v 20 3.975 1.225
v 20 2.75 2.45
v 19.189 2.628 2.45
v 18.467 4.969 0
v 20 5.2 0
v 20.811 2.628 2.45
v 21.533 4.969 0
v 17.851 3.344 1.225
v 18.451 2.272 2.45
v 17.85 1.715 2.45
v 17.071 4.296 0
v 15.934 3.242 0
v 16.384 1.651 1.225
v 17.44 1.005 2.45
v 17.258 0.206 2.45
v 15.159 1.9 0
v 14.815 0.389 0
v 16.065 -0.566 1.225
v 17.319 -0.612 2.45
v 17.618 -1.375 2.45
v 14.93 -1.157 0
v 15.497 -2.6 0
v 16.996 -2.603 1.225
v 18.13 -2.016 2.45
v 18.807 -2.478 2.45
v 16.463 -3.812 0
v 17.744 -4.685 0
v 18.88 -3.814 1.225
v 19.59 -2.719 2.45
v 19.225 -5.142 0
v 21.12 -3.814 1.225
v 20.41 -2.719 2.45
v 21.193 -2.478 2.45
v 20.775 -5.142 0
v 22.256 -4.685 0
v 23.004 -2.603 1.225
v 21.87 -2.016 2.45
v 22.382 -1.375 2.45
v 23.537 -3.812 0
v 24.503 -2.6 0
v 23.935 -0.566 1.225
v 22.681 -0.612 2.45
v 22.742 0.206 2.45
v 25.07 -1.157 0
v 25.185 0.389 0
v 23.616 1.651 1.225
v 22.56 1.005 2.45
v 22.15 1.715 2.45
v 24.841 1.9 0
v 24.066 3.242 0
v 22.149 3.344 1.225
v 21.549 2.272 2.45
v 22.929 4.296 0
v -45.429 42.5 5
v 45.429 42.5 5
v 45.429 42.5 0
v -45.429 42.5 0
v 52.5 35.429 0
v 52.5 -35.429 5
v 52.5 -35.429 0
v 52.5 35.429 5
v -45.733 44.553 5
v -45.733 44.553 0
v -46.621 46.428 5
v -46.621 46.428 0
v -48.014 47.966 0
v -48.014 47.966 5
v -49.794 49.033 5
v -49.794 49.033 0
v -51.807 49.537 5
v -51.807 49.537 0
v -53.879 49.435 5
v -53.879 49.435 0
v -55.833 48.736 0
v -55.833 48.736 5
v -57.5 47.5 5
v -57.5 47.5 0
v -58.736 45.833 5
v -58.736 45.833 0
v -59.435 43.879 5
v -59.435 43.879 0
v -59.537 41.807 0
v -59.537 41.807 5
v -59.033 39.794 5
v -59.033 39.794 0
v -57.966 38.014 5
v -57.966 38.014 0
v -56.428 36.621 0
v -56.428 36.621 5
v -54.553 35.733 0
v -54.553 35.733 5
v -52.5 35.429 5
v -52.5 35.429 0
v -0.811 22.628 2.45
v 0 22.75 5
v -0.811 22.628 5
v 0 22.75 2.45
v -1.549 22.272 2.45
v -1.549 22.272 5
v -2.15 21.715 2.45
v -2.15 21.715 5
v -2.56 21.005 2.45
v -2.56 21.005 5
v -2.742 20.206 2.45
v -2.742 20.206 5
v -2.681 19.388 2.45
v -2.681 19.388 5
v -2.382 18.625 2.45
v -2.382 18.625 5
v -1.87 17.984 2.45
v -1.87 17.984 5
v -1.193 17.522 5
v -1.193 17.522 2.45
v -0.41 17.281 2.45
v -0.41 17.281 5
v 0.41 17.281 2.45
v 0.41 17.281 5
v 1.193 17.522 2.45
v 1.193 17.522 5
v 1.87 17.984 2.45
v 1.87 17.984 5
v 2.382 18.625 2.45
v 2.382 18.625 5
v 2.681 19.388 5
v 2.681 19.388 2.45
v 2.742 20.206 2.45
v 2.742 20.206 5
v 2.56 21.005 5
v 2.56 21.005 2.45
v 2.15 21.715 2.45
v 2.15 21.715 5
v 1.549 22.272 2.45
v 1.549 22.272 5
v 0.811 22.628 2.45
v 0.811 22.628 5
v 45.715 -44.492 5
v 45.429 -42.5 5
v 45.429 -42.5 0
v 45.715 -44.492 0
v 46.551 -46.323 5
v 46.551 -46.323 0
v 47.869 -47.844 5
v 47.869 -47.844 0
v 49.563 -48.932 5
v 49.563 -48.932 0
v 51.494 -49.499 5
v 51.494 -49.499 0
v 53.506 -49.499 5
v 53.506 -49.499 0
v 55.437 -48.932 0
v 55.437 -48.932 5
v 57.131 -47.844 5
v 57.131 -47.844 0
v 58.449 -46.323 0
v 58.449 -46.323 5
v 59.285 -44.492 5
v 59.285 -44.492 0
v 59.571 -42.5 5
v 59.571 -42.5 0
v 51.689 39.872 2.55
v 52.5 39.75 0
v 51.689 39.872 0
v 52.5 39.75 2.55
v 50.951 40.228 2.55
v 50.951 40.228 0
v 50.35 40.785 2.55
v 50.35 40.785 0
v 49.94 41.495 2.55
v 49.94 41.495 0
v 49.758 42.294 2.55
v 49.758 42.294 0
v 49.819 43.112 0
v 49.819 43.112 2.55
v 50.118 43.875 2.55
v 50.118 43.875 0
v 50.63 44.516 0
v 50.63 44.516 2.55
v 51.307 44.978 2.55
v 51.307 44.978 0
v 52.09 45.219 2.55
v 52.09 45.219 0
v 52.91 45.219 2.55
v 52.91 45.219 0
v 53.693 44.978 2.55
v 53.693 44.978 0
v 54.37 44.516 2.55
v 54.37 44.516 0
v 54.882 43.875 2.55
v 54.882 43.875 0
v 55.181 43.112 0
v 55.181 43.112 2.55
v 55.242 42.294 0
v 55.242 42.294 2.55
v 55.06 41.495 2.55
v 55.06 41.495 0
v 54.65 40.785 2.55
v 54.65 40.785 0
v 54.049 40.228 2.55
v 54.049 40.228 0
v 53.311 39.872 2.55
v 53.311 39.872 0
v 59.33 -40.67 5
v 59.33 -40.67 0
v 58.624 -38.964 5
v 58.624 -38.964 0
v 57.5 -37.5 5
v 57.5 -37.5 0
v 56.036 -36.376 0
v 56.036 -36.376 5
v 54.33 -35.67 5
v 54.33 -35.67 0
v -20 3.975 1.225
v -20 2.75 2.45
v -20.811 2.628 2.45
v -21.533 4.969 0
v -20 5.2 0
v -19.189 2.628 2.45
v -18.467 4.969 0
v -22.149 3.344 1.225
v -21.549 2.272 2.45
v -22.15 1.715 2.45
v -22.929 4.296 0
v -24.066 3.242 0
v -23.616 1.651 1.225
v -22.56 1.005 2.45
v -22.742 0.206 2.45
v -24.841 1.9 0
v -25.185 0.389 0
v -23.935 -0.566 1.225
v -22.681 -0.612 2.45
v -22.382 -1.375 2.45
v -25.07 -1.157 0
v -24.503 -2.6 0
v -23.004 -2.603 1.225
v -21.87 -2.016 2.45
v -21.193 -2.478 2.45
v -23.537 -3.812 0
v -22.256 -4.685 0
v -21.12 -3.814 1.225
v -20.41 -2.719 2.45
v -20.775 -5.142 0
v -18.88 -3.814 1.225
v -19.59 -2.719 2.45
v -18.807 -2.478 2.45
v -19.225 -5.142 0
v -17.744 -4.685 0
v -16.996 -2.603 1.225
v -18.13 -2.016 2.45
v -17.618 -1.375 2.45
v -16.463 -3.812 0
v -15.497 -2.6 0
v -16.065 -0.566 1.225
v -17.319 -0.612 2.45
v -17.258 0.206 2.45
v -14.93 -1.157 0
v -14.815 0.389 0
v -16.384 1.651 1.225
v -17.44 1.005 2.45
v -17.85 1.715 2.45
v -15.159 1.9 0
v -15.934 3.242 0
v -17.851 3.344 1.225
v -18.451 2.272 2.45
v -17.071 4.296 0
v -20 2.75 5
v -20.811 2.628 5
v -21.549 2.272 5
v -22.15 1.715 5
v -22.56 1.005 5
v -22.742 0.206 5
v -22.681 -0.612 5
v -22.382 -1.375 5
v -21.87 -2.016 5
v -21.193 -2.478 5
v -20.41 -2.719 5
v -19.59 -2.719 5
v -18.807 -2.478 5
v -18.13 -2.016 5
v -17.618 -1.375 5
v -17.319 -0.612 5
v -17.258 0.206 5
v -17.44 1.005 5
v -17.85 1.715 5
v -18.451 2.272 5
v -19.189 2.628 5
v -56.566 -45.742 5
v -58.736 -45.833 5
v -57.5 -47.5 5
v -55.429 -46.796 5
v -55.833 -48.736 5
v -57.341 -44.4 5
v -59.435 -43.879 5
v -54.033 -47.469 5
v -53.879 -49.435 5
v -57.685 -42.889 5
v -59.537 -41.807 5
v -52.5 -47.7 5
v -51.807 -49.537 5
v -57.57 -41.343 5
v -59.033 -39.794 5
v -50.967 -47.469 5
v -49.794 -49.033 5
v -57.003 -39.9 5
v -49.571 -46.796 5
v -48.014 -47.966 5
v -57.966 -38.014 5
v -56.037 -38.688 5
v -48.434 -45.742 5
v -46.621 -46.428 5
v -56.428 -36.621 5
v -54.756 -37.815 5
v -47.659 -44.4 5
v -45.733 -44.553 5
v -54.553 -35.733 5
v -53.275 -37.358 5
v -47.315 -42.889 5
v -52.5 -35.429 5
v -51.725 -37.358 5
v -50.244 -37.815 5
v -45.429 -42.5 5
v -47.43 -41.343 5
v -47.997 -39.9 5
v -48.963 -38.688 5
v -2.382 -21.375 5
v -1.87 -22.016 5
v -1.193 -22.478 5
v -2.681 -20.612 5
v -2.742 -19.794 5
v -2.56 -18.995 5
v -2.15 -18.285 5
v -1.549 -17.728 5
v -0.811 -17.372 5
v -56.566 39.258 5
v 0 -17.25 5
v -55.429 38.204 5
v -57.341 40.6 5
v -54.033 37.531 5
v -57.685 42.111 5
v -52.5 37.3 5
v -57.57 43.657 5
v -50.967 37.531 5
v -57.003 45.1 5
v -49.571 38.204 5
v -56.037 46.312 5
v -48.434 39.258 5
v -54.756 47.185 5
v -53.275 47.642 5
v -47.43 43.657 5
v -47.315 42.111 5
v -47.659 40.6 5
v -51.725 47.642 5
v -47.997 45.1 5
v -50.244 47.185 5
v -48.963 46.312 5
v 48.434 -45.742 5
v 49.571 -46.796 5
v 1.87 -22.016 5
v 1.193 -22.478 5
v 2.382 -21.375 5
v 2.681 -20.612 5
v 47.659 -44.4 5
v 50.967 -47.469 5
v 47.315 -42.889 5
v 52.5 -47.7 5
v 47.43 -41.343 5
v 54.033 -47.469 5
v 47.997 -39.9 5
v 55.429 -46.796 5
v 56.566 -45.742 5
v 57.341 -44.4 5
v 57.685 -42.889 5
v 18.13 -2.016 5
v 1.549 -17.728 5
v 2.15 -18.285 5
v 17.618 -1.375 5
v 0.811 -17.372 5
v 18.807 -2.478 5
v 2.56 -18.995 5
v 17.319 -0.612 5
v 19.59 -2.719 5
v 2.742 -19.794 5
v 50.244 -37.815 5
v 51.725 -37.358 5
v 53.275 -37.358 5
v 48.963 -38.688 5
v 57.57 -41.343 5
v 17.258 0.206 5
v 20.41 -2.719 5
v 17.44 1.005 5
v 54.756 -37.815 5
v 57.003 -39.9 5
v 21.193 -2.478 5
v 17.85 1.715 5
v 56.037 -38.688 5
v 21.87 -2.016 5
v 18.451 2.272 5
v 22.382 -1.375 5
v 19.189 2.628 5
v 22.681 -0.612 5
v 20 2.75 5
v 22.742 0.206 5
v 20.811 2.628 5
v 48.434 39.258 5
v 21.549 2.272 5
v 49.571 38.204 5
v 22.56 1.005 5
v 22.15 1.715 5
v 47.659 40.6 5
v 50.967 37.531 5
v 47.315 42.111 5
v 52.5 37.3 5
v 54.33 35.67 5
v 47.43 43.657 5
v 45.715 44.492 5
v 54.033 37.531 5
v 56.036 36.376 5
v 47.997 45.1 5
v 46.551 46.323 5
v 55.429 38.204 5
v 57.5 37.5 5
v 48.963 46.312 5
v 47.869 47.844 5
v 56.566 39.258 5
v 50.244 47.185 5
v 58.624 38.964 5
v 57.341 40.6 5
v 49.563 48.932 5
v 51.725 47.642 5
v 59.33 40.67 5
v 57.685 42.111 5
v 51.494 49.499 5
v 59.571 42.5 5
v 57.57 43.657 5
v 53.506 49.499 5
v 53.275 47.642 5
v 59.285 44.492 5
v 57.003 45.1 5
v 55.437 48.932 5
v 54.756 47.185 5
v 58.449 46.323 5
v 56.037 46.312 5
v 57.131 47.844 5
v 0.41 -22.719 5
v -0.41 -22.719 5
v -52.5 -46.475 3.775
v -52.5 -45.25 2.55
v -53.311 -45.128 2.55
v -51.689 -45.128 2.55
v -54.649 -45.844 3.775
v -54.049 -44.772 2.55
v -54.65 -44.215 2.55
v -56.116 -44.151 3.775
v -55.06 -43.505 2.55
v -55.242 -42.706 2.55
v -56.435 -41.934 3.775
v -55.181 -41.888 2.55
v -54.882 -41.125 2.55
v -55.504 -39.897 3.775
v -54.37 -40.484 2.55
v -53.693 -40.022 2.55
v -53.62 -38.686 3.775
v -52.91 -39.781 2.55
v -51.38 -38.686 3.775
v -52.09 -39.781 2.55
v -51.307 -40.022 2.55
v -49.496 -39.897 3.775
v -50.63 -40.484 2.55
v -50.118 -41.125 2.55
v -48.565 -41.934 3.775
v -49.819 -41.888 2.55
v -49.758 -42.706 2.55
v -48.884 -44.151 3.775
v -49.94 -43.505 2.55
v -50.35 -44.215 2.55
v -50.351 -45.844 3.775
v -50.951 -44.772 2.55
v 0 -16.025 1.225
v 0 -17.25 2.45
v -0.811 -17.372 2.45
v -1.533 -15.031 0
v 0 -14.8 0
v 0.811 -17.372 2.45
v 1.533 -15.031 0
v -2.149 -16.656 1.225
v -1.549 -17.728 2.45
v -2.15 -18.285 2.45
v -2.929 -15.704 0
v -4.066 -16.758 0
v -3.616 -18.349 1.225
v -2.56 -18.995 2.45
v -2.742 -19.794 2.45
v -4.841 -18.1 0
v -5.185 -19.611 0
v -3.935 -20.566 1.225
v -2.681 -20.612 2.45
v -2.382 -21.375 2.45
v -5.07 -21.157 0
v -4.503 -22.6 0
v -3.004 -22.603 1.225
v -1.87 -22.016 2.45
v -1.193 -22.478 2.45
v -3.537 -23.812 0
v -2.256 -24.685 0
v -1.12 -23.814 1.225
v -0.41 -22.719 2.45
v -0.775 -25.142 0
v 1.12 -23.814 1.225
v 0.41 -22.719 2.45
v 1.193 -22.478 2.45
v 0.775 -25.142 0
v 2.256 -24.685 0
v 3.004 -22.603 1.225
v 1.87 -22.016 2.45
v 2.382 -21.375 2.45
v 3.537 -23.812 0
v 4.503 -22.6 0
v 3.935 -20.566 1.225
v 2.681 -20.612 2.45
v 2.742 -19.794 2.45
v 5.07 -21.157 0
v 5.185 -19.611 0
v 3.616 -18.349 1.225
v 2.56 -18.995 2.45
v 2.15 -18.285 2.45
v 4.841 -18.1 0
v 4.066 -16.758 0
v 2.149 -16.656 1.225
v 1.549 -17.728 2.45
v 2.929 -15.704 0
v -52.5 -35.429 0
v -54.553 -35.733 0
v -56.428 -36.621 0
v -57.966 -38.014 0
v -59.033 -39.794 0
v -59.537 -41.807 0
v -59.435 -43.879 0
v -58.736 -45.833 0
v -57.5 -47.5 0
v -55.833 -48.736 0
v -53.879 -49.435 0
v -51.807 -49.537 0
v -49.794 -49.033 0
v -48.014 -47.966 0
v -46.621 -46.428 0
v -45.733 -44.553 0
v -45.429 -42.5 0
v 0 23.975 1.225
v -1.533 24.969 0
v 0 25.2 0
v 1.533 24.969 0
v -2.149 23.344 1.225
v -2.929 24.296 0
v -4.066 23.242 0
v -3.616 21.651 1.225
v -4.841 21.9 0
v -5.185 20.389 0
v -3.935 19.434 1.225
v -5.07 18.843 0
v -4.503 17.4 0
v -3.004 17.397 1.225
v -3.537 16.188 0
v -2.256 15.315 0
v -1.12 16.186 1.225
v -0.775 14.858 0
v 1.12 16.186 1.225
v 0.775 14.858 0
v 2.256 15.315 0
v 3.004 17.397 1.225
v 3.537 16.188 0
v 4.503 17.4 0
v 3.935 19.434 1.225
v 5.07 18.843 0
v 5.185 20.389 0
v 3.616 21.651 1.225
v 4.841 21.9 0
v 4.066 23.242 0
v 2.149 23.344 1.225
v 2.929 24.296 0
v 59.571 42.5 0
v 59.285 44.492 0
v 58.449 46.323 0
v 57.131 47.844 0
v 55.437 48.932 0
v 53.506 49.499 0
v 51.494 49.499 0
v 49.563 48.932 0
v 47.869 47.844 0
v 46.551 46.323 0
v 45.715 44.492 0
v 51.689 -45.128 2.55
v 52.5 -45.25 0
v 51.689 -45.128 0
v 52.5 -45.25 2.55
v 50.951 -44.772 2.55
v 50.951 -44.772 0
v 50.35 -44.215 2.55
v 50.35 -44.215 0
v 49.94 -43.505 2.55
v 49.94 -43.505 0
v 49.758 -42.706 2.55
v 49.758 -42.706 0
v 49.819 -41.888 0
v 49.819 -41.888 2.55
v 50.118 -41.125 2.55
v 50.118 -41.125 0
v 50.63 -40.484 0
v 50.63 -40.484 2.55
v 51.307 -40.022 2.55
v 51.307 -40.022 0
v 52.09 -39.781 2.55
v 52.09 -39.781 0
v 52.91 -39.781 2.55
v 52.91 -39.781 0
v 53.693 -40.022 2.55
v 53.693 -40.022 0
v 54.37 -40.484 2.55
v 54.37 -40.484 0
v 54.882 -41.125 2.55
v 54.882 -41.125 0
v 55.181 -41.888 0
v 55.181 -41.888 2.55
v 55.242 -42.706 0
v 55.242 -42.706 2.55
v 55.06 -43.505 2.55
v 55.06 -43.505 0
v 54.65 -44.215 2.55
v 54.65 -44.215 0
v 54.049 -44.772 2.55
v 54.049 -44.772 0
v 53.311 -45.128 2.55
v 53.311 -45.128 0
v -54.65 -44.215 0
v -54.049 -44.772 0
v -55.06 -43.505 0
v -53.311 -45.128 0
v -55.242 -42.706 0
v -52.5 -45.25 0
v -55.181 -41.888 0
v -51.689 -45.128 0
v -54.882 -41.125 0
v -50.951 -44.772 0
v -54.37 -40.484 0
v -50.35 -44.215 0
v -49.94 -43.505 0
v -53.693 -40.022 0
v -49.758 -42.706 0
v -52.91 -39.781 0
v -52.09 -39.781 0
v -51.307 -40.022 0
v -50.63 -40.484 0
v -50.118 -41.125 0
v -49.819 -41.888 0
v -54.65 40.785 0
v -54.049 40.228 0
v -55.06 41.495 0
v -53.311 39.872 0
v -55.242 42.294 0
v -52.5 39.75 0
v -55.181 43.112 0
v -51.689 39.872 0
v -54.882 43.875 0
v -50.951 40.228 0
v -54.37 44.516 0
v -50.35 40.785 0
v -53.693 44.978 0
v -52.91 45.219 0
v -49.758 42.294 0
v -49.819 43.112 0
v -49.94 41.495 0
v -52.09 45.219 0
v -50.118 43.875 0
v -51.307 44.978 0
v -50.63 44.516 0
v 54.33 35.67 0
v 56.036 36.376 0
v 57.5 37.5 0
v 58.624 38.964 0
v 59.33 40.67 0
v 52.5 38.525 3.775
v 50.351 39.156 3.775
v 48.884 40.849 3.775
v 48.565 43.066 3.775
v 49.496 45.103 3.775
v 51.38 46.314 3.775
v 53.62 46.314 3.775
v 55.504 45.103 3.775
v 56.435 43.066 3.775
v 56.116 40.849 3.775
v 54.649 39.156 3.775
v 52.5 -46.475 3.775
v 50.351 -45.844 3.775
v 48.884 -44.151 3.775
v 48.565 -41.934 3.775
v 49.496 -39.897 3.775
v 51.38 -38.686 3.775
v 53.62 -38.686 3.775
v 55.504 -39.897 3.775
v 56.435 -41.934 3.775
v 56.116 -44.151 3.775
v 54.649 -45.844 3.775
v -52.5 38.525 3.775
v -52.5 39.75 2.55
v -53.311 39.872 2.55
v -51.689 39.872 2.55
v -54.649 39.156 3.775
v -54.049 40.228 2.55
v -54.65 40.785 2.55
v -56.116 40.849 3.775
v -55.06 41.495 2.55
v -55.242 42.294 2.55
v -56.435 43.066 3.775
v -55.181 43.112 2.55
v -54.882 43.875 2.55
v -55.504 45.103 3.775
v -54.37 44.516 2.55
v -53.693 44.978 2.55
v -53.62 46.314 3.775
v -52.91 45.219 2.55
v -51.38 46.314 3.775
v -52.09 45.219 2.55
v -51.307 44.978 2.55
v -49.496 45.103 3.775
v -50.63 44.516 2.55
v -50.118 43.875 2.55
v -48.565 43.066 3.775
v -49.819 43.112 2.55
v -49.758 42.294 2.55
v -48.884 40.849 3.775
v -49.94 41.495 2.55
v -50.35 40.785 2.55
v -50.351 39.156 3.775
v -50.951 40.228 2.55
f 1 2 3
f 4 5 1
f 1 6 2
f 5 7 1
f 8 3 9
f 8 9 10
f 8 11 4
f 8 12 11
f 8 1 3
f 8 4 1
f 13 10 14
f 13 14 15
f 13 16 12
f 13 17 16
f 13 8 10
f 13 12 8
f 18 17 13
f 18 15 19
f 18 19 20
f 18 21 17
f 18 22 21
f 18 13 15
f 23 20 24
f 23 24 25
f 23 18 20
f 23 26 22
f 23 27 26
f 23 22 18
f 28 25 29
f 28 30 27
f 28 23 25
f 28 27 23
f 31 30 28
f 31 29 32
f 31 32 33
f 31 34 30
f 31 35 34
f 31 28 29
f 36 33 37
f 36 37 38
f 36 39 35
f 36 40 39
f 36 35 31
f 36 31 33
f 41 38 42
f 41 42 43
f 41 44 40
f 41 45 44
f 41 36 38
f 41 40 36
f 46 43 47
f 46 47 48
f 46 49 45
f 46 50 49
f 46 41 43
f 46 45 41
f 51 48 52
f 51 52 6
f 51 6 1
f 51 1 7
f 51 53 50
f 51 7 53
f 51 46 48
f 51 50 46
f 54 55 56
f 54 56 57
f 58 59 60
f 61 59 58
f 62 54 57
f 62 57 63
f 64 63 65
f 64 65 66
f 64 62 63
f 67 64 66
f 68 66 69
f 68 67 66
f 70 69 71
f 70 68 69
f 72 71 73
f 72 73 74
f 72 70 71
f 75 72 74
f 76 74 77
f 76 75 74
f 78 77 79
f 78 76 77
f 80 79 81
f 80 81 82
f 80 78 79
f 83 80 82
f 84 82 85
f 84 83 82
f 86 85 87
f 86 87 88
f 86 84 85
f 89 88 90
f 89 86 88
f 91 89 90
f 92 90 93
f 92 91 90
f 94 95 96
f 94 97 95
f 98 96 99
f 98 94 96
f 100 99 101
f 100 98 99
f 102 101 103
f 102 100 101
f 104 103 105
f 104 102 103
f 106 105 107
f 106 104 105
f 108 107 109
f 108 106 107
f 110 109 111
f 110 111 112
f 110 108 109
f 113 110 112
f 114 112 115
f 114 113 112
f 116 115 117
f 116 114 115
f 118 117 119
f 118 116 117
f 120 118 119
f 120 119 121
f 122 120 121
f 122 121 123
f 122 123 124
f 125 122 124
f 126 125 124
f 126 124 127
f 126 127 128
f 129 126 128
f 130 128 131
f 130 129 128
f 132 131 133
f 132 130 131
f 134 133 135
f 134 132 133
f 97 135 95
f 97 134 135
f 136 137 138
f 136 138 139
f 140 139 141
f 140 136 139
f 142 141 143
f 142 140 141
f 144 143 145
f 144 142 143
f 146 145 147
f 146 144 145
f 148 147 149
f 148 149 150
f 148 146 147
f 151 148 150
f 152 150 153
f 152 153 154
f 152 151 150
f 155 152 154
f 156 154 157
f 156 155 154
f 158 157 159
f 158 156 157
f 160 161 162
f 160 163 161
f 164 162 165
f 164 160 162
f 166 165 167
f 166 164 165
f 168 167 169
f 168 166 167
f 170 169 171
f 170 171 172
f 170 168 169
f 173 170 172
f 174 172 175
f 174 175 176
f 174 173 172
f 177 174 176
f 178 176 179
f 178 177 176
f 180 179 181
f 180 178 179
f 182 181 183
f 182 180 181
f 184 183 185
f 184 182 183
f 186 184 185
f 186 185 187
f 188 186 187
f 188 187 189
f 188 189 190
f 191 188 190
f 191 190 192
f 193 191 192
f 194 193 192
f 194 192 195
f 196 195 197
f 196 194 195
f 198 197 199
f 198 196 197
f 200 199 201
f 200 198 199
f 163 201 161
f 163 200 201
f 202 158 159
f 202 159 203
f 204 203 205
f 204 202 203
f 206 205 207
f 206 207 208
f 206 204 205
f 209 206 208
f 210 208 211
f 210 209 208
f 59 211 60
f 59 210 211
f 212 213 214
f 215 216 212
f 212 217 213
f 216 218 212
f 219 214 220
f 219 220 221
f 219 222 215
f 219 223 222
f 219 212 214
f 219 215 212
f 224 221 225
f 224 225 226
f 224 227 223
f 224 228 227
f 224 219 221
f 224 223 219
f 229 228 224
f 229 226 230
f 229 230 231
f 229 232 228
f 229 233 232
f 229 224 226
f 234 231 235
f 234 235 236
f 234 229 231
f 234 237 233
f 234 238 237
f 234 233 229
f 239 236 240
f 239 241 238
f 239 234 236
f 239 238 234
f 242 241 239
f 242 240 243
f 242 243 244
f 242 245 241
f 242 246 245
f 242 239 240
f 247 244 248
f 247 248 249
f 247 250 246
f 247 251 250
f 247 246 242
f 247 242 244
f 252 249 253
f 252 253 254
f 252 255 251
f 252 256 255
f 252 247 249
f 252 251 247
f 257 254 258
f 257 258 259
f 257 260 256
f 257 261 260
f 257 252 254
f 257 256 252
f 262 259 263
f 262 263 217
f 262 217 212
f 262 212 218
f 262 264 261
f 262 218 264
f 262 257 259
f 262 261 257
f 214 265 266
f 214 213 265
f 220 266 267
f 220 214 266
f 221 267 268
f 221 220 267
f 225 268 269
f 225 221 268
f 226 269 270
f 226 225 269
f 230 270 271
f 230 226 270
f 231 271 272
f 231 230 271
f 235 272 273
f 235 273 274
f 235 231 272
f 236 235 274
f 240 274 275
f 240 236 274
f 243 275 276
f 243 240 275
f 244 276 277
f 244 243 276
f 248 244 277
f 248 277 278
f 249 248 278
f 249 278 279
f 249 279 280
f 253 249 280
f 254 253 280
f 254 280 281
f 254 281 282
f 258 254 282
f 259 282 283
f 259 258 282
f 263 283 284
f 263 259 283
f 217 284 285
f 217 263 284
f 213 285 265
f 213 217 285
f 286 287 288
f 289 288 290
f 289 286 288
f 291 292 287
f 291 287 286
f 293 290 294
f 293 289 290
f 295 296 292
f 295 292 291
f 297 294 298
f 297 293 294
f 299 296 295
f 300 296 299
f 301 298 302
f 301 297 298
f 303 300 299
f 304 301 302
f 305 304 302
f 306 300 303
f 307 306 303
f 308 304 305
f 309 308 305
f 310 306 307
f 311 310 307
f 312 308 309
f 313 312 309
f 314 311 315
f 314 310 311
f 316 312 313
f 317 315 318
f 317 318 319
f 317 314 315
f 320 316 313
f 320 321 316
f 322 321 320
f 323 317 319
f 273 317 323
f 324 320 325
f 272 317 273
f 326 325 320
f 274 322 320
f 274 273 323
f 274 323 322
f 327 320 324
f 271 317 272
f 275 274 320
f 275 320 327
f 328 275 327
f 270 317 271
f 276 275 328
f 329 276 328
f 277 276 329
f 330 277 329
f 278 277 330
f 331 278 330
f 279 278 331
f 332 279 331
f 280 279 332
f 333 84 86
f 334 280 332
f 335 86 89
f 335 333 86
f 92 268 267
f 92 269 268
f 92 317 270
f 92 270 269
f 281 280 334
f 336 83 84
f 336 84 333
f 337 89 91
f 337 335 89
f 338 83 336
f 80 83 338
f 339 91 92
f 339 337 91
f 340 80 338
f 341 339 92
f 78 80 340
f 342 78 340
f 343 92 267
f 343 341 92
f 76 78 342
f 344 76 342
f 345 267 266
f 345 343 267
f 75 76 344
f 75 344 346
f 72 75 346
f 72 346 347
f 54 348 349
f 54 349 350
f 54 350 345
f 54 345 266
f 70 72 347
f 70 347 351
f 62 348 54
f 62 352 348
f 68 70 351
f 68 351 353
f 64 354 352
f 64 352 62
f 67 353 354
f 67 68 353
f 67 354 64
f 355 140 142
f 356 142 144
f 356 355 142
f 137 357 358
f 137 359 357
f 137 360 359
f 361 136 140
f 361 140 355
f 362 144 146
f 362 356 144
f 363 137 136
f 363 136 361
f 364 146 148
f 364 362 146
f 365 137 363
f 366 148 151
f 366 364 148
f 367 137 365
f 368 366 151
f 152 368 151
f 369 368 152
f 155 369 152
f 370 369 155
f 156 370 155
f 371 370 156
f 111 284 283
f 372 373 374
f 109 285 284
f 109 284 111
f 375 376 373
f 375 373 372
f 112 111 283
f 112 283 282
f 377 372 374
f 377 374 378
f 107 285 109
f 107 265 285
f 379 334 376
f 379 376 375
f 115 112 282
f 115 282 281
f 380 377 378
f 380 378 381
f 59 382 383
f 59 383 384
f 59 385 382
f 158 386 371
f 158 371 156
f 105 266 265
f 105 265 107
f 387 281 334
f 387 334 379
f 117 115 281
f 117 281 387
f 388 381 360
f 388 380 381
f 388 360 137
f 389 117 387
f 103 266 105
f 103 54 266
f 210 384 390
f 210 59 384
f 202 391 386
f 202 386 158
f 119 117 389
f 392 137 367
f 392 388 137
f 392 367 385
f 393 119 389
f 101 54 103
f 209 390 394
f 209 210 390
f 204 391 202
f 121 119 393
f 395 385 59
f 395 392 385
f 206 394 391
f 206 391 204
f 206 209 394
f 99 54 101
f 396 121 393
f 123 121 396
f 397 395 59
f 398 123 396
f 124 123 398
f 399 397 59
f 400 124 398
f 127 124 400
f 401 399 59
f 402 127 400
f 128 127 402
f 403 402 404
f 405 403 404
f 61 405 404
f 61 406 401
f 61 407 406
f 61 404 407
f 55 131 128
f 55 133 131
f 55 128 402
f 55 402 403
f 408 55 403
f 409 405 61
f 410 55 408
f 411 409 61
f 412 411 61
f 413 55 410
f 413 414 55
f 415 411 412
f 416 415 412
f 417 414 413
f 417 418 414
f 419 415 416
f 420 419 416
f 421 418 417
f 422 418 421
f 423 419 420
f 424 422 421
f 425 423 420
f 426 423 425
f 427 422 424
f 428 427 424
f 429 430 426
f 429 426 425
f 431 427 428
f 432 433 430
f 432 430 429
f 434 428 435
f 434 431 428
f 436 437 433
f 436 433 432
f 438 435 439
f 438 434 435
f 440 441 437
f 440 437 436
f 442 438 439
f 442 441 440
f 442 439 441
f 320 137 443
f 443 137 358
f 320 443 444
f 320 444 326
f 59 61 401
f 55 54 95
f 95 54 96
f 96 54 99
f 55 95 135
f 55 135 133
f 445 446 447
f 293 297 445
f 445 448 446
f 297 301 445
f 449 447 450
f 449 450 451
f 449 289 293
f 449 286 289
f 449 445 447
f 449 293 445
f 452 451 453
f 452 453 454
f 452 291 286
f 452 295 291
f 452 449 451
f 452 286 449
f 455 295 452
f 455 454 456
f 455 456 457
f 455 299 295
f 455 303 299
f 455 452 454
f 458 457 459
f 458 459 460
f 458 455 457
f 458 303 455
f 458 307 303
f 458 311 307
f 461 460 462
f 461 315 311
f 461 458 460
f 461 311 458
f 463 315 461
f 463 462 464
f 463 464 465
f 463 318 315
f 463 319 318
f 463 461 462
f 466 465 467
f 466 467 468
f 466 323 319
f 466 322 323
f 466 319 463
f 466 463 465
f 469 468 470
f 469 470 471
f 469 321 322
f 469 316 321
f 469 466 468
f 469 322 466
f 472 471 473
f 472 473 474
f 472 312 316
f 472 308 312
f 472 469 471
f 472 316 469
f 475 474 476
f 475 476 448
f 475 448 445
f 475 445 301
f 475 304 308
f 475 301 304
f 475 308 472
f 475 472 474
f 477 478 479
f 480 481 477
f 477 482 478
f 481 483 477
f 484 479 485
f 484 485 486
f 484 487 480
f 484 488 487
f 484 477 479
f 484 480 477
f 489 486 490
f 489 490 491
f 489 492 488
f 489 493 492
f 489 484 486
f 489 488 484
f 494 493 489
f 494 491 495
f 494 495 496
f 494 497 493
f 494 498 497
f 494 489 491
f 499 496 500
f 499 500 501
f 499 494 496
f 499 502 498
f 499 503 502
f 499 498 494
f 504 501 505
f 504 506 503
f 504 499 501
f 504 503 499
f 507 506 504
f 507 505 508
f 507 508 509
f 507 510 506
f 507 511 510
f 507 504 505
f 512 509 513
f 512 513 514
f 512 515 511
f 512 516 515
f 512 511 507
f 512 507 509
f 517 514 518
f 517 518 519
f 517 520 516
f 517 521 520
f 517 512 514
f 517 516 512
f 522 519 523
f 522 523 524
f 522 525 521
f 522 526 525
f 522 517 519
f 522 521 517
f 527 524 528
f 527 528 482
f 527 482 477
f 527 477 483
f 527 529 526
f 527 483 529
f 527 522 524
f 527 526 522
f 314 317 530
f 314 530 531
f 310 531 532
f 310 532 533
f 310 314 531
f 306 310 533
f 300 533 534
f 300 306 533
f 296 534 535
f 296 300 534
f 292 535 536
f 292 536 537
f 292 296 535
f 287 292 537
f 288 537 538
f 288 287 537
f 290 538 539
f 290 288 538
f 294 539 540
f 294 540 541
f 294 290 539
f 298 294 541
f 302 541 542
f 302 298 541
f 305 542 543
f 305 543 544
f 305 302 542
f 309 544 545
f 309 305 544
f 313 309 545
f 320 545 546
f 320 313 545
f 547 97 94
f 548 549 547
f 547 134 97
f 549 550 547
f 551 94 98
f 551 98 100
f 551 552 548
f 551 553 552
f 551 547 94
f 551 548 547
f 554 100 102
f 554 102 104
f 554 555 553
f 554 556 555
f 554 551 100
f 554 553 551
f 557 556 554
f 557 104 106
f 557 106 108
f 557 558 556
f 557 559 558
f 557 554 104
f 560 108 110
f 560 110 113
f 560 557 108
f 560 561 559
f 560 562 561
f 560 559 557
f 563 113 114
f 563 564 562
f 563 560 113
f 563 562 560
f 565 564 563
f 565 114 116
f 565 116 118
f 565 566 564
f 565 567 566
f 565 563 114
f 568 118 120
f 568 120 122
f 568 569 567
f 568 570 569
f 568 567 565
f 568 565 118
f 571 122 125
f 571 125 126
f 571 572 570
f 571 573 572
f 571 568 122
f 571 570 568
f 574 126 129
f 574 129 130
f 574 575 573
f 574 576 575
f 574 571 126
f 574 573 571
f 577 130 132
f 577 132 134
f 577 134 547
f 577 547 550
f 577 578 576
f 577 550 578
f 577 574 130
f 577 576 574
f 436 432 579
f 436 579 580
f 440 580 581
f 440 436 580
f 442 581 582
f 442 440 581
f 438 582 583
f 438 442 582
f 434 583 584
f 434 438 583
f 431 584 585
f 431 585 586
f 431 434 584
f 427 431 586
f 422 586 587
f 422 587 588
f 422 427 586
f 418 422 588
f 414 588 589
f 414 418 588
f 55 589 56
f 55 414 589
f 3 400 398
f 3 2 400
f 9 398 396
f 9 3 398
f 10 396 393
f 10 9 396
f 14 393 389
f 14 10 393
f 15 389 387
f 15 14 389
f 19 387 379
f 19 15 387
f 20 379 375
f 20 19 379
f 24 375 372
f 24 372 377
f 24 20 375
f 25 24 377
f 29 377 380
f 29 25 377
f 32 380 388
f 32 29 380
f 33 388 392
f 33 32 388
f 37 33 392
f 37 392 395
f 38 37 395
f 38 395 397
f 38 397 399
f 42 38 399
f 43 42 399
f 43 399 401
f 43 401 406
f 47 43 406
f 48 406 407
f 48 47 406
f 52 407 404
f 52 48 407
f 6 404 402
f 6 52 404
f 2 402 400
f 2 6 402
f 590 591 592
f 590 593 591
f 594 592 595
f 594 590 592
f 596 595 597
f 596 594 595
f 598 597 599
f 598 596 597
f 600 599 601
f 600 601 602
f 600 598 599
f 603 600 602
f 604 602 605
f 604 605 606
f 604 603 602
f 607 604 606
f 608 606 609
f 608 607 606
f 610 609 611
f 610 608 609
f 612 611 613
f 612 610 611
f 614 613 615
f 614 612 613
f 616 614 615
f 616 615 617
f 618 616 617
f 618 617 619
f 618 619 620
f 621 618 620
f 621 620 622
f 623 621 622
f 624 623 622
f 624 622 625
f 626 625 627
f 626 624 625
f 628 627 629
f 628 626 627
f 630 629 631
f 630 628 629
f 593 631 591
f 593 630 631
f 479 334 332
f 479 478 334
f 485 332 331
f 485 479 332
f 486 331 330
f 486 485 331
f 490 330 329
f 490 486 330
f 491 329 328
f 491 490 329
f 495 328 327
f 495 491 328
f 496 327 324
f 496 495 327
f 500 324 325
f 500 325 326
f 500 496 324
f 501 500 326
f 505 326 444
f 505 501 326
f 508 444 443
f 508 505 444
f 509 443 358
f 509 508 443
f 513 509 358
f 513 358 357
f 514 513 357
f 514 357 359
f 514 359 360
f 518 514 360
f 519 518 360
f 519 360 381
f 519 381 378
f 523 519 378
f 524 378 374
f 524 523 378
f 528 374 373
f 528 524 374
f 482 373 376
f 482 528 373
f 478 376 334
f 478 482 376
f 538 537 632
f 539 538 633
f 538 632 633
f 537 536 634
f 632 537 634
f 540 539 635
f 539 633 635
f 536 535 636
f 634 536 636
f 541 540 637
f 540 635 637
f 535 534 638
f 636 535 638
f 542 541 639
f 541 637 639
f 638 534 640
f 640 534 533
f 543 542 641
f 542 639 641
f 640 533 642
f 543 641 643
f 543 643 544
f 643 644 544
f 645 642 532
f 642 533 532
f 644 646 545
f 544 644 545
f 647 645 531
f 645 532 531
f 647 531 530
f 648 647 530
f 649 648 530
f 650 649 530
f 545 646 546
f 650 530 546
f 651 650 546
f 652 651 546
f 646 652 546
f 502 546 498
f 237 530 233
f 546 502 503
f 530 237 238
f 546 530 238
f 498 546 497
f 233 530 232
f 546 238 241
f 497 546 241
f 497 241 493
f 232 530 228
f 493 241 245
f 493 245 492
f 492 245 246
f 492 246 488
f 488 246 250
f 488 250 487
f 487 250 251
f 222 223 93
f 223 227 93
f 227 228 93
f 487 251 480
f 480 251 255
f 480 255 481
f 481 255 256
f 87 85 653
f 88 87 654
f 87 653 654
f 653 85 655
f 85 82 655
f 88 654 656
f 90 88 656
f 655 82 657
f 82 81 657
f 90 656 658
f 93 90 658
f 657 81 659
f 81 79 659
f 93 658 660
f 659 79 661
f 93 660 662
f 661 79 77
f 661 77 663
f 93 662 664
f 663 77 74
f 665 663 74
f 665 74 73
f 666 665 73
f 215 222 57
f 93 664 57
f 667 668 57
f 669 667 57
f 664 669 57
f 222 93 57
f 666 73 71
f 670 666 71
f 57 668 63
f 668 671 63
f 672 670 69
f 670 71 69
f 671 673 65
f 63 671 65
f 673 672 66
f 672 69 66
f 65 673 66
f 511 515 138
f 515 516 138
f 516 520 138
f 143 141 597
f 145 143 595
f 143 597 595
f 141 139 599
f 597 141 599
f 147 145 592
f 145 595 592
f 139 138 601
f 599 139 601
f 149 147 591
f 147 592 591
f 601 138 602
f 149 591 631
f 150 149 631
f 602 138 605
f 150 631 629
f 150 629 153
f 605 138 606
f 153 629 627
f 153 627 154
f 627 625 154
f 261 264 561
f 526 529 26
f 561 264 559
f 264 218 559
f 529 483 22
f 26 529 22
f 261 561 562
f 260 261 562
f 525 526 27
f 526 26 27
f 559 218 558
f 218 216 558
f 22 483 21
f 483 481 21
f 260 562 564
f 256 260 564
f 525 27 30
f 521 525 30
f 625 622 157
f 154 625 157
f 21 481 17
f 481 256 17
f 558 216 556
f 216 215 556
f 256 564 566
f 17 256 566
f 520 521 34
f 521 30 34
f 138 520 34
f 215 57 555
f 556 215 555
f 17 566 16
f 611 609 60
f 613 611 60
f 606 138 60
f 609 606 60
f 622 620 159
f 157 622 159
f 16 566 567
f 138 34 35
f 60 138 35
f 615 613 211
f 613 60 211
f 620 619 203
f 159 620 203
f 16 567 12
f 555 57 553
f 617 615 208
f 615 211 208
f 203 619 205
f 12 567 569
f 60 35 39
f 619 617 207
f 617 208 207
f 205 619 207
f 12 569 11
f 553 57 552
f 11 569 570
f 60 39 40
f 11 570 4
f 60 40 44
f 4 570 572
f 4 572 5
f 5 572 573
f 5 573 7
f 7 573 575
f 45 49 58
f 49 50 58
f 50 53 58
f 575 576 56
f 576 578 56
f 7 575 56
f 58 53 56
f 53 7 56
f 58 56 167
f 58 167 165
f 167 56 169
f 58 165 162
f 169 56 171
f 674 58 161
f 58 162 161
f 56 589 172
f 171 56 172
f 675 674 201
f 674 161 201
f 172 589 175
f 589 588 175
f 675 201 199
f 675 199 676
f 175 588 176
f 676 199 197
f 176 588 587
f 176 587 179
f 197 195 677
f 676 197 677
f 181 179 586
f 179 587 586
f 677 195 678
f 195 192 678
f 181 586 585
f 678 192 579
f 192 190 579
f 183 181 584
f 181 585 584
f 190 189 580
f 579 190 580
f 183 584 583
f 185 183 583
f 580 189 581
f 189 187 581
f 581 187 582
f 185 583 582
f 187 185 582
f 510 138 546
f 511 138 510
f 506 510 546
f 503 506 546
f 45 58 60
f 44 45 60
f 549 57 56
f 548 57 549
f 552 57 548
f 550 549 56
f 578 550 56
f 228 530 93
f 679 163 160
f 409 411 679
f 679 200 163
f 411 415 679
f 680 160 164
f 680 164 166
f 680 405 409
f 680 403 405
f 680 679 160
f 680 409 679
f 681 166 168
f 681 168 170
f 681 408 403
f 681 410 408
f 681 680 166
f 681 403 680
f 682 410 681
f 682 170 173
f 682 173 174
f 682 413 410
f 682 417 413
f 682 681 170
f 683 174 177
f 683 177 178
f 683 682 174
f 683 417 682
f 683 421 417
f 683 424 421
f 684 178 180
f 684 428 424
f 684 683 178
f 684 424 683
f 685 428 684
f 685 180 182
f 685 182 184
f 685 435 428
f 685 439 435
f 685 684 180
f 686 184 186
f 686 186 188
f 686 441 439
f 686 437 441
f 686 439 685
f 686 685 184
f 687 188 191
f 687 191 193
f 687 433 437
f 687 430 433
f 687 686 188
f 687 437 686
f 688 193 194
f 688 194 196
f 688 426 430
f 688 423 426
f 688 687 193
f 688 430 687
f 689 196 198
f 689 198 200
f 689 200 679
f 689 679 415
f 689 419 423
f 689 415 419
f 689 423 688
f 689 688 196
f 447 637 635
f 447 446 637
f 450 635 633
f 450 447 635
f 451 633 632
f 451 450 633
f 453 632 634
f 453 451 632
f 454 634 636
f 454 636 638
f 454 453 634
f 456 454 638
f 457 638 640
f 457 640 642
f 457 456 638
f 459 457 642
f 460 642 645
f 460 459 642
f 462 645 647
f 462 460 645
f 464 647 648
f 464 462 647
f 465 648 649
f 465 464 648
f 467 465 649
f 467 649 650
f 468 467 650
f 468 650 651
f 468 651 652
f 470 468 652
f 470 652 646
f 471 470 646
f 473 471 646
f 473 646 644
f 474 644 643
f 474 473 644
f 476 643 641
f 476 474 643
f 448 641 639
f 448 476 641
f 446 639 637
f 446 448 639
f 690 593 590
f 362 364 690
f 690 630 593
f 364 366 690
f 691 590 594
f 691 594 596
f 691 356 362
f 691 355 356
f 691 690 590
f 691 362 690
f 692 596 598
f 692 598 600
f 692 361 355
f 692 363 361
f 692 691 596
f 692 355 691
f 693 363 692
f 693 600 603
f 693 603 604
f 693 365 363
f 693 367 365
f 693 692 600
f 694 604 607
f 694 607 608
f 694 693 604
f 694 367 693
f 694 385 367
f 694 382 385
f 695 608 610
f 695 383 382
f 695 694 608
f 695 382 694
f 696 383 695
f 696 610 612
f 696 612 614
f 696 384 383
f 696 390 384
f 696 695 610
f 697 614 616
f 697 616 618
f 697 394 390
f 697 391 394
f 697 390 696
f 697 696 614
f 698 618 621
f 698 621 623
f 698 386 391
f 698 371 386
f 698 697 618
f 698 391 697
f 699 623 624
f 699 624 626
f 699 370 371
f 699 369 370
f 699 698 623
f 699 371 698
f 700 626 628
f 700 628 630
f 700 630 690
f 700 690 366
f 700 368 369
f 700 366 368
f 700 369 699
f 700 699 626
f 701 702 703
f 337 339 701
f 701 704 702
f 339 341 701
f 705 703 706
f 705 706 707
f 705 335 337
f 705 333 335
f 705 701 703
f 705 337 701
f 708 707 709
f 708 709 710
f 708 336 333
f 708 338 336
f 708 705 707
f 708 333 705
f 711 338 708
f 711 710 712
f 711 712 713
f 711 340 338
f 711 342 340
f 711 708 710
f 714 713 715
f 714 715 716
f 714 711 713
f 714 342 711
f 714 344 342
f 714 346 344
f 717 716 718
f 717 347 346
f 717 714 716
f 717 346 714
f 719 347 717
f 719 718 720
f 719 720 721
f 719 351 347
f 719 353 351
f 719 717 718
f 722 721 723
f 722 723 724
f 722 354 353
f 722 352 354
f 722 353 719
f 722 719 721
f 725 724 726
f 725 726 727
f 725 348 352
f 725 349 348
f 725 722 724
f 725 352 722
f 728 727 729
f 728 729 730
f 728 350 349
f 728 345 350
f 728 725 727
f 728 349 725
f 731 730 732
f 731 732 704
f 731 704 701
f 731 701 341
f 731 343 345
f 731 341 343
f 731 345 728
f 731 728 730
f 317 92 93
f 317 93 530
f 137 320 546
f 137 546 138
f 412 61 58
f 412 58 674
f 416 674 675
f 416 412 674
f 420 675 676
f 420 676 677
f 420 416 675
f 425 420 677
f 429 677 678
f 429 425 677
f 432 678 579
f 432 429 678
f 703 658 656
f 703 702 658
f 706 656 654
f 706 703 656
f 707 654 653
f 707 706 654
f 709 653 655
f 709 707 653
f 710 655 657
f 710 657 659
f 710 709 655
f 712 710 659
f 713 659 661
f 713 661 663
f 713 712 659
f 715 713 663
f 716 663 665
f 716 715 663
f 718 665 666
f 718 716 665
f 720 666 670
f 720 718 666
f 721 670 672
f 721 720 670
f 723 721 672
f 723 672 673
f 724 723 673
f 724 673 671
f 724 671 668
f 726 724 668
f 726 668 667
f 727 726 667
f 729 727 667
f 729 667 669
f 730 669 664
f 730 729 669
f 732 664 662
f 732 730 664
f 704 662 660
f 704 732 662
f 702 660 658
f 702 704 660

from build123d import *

# Parameters (mm, degrees)
SKETCH1_W                                      = 75
SKETCH1_H                                      = 95
SKETCH1_R                                      = 1
BOSS_EXTRUDE1_DEPTH                            = 5
CSK_FOR_M5_FLAT_HEAD_MACHINE_SCREW1_AT_2_COUNT = 2
CSK_FOR_M5_FLAT_HEAD_MACHINE_SCREW1_AT_2_PITCH = 28.284271247
CSK_FOR_M5_FLAT_HEAD_MACHINE_SCREW1_AT_3_COUNT = 2
CSK_FOR_M5_FLAT_HEAD_MACHINE_SCREW1_AT_3_PITCH = 40
CSK_FOR_M5_FLAT_HEAD_MACHINE_SCREW1_AT_4_COUNT = 2
CSK_FOR_M5_FLAT_HEAD_MACHINE_SCREW1_AT_4_PITCH = 28.284271247
BOSS_EXTRUDE2_DEPTH                            = 5
CSK_FOR_M5_FLAT_HEAD_MACHINE_SCREW2_AT_2_COUNT = 2
CSK_FOR_M5_FLAT_HEAD_MACHINE_SCREW2_AT_2_PITCH = 105
CSK_FOR_M5_FLAT_HEAD_MACHINE_SCREW2_AT_3_COUNT = 2
CSK_FOR_M5_FLAT_HEAD_MACHINE_SCREW2_AT_3_PITCH = 135.092560861
CSK_FOR_M5_FLAT_HEAD_MACHINE_SCREW2_AT_4_COUNT = 2
CSK_FOR_M5_FLAT_HEAD_MACHINE_SCREW2_AT_4_PITCH = 85


with BuildPart() as part:
    # Sketch1 → Boss-Extrude1 (new body)
    with BuildSketch(Plane(origin=(0, 0, 0), x_dir=(0, 1, 0), z_dir=(0, 0, 1))):
        Rectangle(SKETCH1_W, SKETCH1_H)
        with Locations(Location((0, 20, 0), (0, 0, 270))):
            Circle(SKETCH1_R, mode=Mode.SUBTRACT)
        with Locations(Location((20, 0, 0), (0, 0, 270))):
            Circle(SKETCH1_R, mode=Mode.SUBTRACT)
        with Locations(Location((0, -20, 0), (0, 0, 270))):
            Circle(SKETCH1_R, mode=Mode.SUBTRACT)
        with Locations(Location((-20, 0, 0), (0, 0, 270))):
            Circle(SKETCH1_R, mode=Mode.SUBTRACT)
    extrude(amount=BOSS_EXTRUDE1_DEPTH)

    # Sketch2 → CSK for M5 Flat Head Machine Screw1 (revolve, cut)
    with BuildSketch(Plane(origin=(0, 20, 0), x_dir=(0, 1, 0), z_dir=(1, 0, 0))):
        Polygon((0, 0), (0, 5), (2.75, 5), (2.75, 2.45), (5.2, 0), align=None)
    csk_for_m5_flat_head_machine_screw1 = revolve(axis=Axis((0, 20, -6.35), (0, 0, 1)), mode=Mode.SUBTRACT)

    # CSK for M5 Flat Head Machine Screw1 at 2: CSK for M5 Flat Head Machine Screw1 ×2
    with Locations(*[Vector(-0.7071067811865475, -0.7071067811865477, 0) * (i * CSK_FOR_M5_FLAT_HEAD_MACHINE_SCREW1_AT_2_PITCH) for i in range(1, CSK_FOR_M5_FLAT_HEAD_MACHINE_SCREW1_AT_2_COUNT)]):
        add(csk_for_m5_flat_head_machine_screw1, mode=Mode.SUBTRACT)

    # CSK for M5 Flat Head Machine Screw1 at 3: CSK for M5 Flat Head Machine Screw1 ×2
    with Locations(*[(0, -i * CSK_FOR_M5_FLAT_HEAD_MACHINE_SCREW1_AT_3_PITCH, 0) for i in range(1, CSK_FOR_M5_FLAT_HEAD_MACHINE_SCREW1_AT_3_COUNT)]):
        add(csk_for_m5_flat_head_machine_screw1, mode=Mode.SUBTRACT)

    # CSK for M5 Flat Head Machine Screw1 at 4: CSK for M5 Flat Head Machine Screw1 ×2
    with Locations(*[Vector(0.7071067811865478, -0.7071067811865472, 0) * (i * CSK_FOR_M5_FLAT_HEAD_MACHINE_SCREW1_AT_4_PITCH) for i in range(1, CSK_FOR_M5_FLAT_HEAD_MACHINE_SCREW1_AT_4_COUNT)]):
        add(csk_for_m5_flat_head_machine_screw1, mode=Mode.SUBTRACT)

    # Sketch3 → Boss-Extrude2 (add)
    with BuildSketch(Plane.XY.offset(5)):
        with BuildLine():
            ThreePointArc((-45.428932188, 42.5), (-57.5, 47.5), (-52.5, 35.428932188))
            Line((-52.5, 35.428932188), (-52.5, 42.5))
            Line((-52.5, 42.5), (-45.428932188, 42.5))
        make_face()
        with BuildLine():
            Line((-52.5, 42.5), (-52.5, 35.428932188))
            ThreePointArc((-52.5, 35.428932188), (-49.794019499, 35.967185176), (-47.5, 37.5))
            ThreePointArc((-47.5, 37.5), (-45.967185176, 39.794019499), (-45.428932188, 42.5))
            Line((-45.428932188, 42.5), (-52.5, 42.5))
        make_face()
        with BuildLine():
            ThreePointArc((-45.428932188, 42.5), (-45.967185176, 39.794019499), (-47.5, 37.5))
            Line((-47.5, 37.5), (47.5, 37.5))
            ThreePointArc((47.5, 37.5), (45.967185176, 39.794019499), (45.428932188, 42.5))
            Line((45.428932188, 42.5), (-45.428932188, 42.5))
        make_face()
        with BuildLine():
            ThreePointArc((45.428932188, 42.5), (45.967185176, 39.794019499), (47.5, 37.5))
            ThreePointArc((47.5, 37.5), (49.794019499, 35.967185176), (52.5, 35.428932188))
            Line((52.5, 35.428932188), (52.5, 42.5))
            Line((52.5, 42.5), (45.428932188, 42.5))
        make_face()
        with BuildLine():
            ThreePointArc((59.571067812, 42.5), (52.5, 49.571067812), (45.428932188, 42.5))
            Line((45.428932188, 42.5), (52.5, 42.5))
            Line((52.5, 42.5), (52.5, 35.428932188))
            ThreePointArc((52.5, 35.428932188), (57.5, 37.5), (59.571067812, 42.5))
        make_face()
        with BuildLine():
            Line((47.5, 37.5), (47.5, -37.5))
            ThreePointArc((47.5, -37.5), (49.794019499, -35.967185176), (52.5, -35.428932188))
            Line((52.5, -35.428932188), (52.5, 35.428932188))
            ThreePointArc((52.5, 35.428932188), (49.794019499, 35.967185176), (47.5, 37.5))
        make_face()
        with BuildLine():
            ThreePointArc((47.5, -37.5), (45.967185176, -39.794019499), (45.428932188, -42.5))
            Line((45.428932188, -42.5), (52.5, -42.5))
            Line((52.5, -42.5), (52.5, -35.428932188))
            ThreePointArc((52.5, -35.428932188), (49.794019499, -35.967185176), (47.5, -37.5))
        make_face()
        with BuildLine():
            Line((52.5, -42.5), (45.428932188, -42.5))
            ThreePointArc((45.428932188, -42.5), (52.5, -49.571067812), (59.571067812, -42.5))
            ThreePointArc((59.571067812, -42.5), (57.5, -37.5), (52.5, -35.428932188))
            Line((52.5, -35.428932188), (52.5, -42.5))
        make_face()
        with BuildLine():
            ThreePointArc((-47.5, -37.5), (-45.967185176, -39.794019499), (-45.428932188, -42.5))
            Line((-45.428932188, -42.5), (45.428932188, -42.5))
            ThreePointArc((45.428932188, -42.5), (45.967185176, -39.794019499), (47.5, -37.5))
            Line((47.5, -37.5), (-47.5, -37.5))
        make_face()
        with BuildLine():
            Line((-52.5, -35.428932188), (-52.5, -42.5))
            Line((-52.5, -42.5), (-45.428932188, -42.5))
            ThreePointArc((-45.428932188, -42.5), (-45.967185176, -39.794019499), (-47.5, -37.5))
            ThreePointArc((-47.5, -37.5), (-49.794019499, -35.967185176), (-52.5, -35.428932188))
        make_face()
        with BuildLine():
            Line((-45.428932188, -42.5), (-52.5, -42.5))
            Line((-52.5, -42.5), (-52.5, -35.428932188))
            ThreePointArc((-52.5, -35.428932188), (-57.5, -47.5), (-45.428932188, -42.5))
        make_face()
        with BuildLine():
            Line((-52.5, 35.428932188), (-52.5, -35.428932188))
            ThreePointArc((-52.5, -35.428932188), (-49.794019499, -35.967185176), (-47.5, -37.5))
            Line((-47.5, -37.5), (-47.5, 37.5))
            ThreePointArc((-47.5, 37.5), (-49.794019499, 35.967185176), (-52.5, 35.428932188))
        make_face()
    extrude(amount=-BOSS_EXTRUDE2_DEPTH)

    # Sketch5 → CSK for M5 Flat Head Machine Screw2 (revolve, cut)
    with BuildSketch(Plane(origin=(-52.5, 42.5, 5), x_dir=(0, -1, 0), z_dir=(1, 0, 0))):
        Polygon((0, 0), (0, 5), (2.75, 5), (2.75, 2.45), (5.2, 0), align=None)
    csk_for_m5_flat_head_machine_screw2 = revolve(axis=Axis((-52.5, 42.5, 11.35), (0, 0, -1)), mode=Mode.SUBTRACT)

    # CSK for M5 Flat Head Machine Screw2 at 2: CSK for M5 Flat Head Machine Screw2 ×2
    with Locations(*[(i * CSK_FOR_M5_FLAT_HEAD_MACHINE_SCREW2_AT_2_PITCH, 0, 0) for i in range(1, CSK_FOR_M5_FLAT_HEAD_MACHINE_SCREW2_AT_2_COUNT)]):
        add(csk_for_m5_flat_head_machine_screw2, mode=Mode.SUBTRACT)

    # CSK for M5 Flat Head Machine Screw2 at 3: CSK for M5 Flat Head Machine Screw2 ×2
    with Locations(*[Vector(0.7772448707074855, -0.6291982286679645, 0) * (i * CSK_FOR_M5_FLAT_HEAD_MACHINE_SCREW2_AT_3_PITCH) for i in range(1, CSK_FOR_M5_FLAT_HEAD_MACHINE_SCREW2_AT_3_COUNT)]):
        add(csk_for_m5_flat_head_machine_screw2, mode=Mode.SUBTRACT)

    # CSK for M5 Flat Head Machine Screw2 at 4: CSK for M5 Flat Head Machine Screw2 ×2
    with Locations(*[(0, -i * CSK_FOR_M5_FLAT_HEAD_MACHINE_SCREW2_AT_4_PITCH, 0) for i in range(1, CSK_FOR_M5_FLAT_HEAD_MACHINE_SCREW2_AT_4_COUNT)]):
        add(csk_for_m5_flat_head_machine_screw2, mode=Mode.SUBTRACT)


solid = part.part
